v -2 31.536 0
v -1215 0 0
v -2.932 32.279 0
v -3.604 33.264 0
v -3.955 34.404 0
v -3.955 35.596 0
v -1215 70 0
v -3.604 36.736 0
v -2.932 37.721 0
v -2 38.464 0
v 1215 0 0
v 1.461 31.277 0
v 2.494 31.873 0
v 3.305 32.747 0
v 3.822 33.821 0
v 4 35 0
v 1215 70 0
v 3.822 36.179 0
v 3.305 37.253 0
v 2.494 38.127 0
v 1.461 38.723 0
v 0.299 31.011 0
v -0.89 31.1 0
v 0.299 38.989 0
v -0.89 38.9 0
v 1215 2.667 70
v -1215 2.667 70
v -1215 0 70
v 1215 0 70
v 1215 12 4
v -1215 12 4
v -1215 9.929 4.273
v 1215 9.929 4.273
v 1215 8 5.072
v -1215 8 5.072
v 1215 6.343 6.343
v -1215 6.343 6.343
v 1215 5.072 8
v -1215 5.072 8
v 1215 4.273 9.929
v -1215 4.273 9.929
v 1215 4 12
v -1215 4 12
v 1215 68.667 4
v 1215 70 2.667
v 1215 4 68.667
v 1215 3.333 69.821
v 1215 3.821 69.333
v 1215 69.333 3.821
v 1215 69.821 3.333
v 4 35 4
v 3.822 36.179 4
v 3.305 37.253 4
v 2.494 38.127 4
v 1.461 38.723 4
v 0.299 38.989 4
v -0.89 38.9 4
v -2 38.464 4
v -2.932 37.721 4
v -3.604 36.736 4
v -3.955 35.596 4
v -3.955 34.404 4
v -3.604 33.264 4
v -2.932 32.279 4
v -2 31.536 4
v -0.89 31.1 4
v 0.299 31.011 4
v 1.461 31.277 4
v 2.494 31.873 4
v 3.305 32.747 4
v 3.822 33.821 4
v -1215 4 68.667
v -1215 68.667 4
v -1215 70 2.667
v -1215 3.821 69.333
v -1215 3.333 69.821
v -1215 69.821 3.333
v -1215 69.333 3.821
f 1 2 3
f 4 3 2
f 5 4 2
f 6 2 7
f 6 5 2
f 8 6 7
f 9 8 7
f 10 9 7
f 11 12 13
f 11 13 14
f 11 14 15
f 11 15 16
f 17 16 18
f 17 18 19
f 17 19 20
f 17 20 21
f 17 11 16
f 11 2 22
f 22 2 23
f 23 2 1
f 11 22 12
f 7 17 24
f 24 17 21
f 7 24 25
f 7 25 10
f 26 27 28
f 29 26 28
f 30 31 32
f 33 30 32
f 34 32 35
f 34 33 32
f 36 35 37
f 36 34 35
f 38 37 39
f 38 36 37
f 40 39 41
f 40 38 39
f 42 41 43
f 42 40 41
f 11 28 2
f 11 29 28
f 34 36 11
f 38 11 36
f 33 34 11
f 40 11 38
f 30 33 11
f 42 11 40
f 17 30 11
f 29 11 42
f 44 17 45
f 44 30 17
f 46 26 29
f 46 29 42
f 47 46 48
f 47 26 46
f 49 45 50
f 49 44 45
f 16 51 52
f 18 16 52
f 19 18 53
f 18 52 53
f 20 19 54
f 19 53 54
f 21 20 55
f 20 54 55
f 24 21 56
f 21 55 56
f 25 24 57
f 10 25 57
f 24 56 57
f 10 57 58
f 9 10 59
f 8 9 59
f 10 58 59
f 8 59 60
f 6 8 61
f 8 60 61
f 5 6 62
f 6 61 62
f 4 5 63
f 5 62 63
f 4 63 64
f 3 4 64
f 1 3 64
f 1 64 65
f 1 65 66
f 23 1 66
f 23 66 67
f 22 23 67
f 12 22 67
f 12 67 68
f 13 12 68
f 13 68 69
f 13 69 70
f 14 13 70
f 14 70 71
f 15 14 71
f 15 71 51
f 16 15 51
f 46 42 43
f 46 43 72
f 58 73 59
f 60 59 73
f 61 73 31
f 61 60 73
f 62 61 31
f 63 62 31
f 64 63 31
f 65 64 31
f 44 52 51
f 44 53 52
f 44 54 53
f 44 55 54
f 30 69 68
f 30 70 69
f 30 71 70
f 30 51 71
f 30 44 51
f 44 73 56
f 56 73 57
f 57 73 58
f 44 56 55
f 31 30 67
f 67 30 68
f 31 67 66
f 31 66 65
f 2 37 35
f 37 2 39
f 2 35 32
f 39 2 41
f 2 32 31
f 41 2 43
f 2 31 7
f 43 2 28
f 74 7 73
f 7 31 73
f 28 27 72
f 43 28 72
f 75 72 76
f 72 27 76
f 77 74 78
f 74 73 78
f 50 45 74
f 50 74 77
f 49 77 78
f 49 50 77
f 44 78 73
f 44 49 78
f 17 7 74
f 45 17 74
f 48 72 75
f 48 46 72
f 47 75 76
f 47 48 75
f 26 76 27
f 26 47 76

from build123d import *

# Parameters (mm, degrees)
BASE_DEPTH          = 1215
SKETCH_1_R          = 4
CUT_EXTRUDE_1_DEPTH = 5


with BuildPart() as part:
    # Sketch1 → Base (new body, symmetric)
    with BuildSketch(Plane.YZ):
        with BuildLine():
            Line((0, 70), (0, 0))
            Line((0, 0), (70, 0))
            Line((70, 0), (70, 2.666666667))
            ThreePointArc((70, 2.666666667), (69.609475708, 3.609475708), (68.666666667, 4))
            Line((68.666666667, 4), (12, 4))
            ThreePointArc((12, 4), (6.343145751, 6.343145751), (4, 12))
            Line((4, 12), (4, 68.666666667))
            ThreePointArc((4, 68.666666667), (3.609475708, 69.609475708), (2.666666667, 70))
            Line((2.666666667, 70), (0, 70))
        make_face()
    extrude(amount=BASE_DEPTH, both=True)

    # 草图1 → 切除-拉伸1 (cut, through all)
    with BuildSketch(Plane.XY.offset(4)):
        with Locations((0, 35)):
            Circle(SKETCH_1_R)
    extrude(amount=-CUT_EXTRUDE_1_DEPTH, mode=Mode.SUBTRACT)


solid = part.part
